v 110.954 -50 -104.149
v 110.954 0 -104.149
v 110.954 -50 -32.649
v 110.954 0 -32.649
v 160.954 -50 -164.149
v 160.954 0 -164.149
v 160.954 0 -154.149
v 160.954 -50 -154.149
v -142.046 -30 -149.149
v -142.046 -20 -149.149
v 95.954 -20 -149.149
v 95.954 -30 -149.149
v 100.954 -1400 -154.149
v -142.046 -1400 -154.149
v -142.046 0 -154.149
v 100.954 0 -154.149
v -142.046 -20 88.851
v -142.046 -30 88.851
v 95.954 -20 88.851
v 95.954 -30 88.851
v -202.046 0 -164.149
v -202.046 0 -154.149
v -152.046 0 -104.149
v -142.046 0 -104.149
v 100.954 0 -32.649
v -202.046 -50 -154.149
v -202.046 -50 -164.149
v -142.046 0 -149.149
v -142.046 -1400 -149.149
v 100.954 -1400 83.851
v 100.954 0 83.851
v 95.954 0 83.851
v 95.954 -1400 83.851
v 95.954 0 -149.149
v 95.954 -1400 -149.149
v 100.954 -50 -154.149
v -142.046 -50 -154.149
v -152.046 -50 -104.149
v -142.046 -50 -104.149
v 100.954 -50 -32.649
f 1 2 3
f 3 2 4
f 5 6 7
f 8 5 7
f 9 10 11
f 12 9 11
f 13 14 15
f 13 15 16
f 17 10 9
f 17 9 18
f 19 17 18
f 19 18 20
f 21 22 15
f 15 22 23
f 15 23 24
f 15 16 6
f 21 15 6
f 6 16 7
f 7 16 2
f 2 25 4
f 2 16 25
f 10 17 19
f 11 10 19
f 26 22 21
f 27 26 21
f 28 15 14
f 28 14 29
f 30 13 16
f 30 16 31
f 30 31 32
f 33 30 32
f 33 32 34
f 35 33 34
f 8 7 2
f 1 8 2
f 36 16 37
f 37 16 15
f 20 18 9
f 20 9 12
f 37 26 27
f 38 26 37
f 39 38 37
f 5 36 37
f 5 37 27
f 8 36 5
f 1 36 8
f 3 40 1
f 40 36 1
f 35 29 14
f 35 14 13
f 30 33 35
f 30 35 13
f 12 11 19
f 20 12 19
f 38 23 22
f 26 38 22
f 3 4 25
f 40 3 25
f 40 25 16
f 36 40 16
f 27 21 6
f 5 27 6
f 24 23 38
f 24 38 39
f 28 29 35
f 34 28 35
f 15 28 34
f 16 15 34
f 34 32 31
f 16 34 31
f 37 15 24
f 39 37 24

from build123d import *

# Parameters (mm, degrees)
F0_W     = 10
F0_H     = 50
F1_DEPTH = 50
F3_W     = 238
F3_H     = 238
F4_DEPTH = 10
F5_W     = 238
F5_H     = 5
F6_DEPTH = 1400


with BuildPart() as f1:
    # F0 (on Front) → F1 (new body)
    with BuildSketch(Plane.XZ):
        with Locations((-147.046215, -129.149129)):
            Rectangle(F0_W, F0_H)
        Polygon((100.953785, -154.149129), (-142.046215, -154.149129), (-152.046215, -154.149129), (-202.046215, -154.149129), (-202.046215, -164.149129), (160.953785, -164.149129), (160.953785, -154.149129), (110.953785, -154.149129), align=None)
        Polygon((100.953785, -32.649129), (100.953785, -154.149129), (110.953785, -154.149129), (110.953785, -104.149129), (110.953785, -32.649129), align=None)
        Polygon((-202.046215, -154.149129), (-152.046215, -154.149129), (-152.046215, -104.149129), align=None)
        Polygon((110.953785, -104.149129), (110.953785, -154.149129), (160.953785, -154.149129), align=None)
    extrude(amount=F1_DEPTH)


with BuildPart() as f4:
    # F3 (on offset) → F4 (new body)
    with BuildSketch(Plane.XZ.offset(20)):
        with Locations((-23.046215, -30.149129)):
            Rectangle(F3_W, F3_H)
    extrude(amount=F4_DEPTH)


with BuildPart() as f6:
    # F5 (on Front) → F6 (new body)
    with BuildSketch(Plane.XZ):
        with Locations((-23.046215, -151.649129)):
            Rectangle(F5_W, F5_H)
        Polygon((95.953785, -149.149129), (95.953785, -154.149129), (100.953785, -154.149129), (100.953785, 83.850871), (95.953785, 83.850871), align=None)
    extrude(amount=F6_DEPTH)


solid = Compound([f1.part, f4.part, f6.part])
